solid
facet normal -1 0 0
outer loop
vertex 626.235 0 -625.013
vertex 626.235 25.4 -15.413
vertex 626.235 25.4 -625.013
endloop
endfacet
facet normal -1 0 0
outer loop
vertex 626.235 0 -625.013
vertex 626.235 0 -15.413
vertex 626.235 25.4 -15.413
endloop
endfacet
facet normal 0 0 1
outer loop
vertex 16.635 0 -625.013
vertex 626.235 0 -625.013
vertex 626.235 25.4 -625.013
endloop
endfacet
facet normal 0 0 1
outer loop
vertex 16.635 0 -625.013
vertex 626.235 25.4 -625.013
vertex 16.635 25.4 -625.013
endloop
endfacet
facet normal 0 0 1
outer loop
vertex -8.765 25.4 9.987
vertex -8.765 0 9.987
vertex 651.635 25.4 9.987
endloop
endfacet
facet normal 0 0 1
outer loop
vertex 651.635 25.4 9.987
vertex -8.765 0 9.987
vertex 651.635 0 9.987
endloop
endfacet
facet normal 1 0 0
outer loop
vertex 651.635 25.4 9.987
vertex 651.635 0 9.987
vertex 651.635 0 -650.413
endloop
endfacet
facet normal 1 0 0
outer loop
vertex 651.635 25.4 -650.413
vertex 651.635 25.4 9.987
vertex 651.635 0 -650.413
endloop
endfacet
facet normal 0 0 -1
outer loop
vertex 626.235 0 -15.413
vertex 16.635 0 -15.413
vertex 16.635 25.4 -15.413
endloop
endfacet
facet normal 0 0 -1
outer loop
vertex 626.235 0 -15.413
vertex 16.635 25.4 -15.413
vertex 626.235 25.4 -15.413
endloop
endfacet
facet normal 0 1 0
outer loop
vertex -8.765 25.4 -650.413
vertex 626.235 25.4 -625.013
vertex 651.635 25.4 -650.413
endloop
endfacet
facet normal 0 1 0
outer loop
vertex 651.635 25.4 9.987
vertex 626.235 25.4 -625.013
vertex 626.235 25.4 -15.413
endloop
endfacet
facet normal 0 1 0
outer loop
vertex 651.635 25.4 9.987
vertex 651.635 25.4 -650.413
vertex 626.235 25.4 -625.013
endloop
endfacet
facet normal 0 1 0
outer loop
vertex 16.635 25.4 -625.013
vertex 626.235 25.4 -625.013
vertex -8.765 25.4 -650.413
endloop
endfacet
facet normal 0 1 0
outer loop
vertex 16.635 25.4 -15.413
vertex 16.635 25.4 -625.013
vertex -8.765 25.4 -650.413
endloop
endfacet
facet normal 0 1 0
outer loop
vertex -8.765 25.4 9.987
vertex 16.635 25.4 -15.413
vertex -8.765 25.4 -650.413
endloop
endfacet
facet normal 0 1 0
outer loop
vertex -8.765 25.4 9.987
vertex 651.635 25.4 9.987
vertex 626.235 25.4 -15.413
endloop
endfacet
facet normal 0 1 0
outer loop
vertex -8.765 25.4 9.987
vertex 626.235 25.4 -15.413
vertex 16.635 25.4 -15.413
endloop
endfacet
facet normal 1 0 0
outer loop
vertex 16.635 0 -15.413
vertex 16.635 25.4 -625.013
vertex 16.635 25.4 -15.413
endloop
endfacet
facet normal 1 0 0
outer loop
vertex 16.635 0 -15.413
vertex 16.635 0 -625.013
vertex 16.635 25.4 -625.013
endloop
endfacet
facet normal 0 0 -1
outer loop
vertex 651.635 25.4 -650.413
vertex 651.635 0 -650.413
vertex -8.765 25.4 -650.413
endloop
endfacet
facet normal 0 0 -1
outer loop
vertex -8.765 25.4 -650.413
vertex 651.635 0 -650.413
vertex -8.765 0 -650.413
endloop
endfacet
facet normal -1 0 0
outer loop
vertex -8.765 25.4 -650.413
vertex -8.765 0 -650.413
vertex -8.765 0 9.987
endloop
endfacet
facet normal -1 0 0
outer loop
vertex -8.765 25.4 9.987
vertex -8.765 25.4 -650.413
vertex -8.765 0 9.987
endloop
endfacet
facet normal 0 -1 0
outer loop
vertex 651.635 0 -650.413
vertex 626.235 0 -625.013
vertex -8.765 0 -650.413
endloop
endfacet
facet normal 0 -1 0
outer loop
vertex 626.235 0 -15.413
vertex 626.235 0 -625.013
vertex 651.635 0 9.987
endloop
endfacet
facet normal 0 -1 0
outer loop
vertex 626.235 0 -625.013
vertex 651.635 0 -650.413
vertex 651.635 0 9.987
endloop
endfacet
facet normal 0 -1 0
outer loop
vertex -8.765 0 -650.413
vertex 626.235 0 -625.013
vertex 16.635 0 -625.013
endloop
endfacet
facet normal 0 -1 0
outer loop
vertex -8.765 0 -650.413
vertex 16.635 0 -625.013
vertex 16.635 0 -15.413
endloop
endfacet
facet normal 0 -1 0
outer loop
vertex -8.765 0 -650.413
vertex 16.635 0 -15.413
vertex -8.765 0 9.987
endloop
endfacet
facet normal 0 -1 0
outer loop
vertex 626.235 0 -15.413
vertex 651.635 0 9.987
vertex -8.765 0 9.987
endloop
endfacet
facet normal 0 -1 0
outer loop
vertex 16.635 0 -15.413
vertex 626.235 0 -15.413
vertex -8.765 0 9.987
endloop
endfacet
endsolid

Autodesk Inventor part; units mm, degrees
ref_plane "YZ Plane" through (0, 0, 0) normal (1, 0, 0) x (0, 1, 0)
ref_plane "XZ Plane" through (0, 0, 0) normal (0, 1, 0) x (-1, 0, 0)
ref_plane "XY Plane" through (0, 0, 0) normal (0, 0, 1) x (1, 0, 0)
sketch "Sketch1" plane through (0, 0, 0) normal (0, 1, 0) x (-1, 0, 0)
  line L0 (8.7651, 9.9871) -> (-651.6349, 9.9871)
  line L1 (-651.6349, 9.9871) -> (-651.6349, -650.4129)
  line L2 (-651.6349, -650.4129) -> (8.7651, -650.4129)
  line L3 (8.7651, -650.4129) -> (8.7651, 9.9871)
  line L4 (-16.6349, -15.4129) -> (-626.2349, -15.4129)
  line L5 (-626.2349, -15.4129) -> (-626.2349, -625.0129)
  line L6 (-626.2349, -625.0129) -> (-16.6349, -625.0129)
  line L7 (-16.6349, -625.0129) -> (-16.6349, -15.4129)
  point P0 (0, 0)
  dimension "d0" = 660.4
  dimension "d1" = 660.4
  dimension "d2" = 25.4
sketch "Sketch2" plane through (0, 0, 0) normal (0, 1, 0) x (-1, 0, 0)
  line L0 (-333.5663, -626.2819) -> (-333.5663, -550.0819) construction
  line L1 (-625.3108, -550.0819) -> (-18.6287, -550.0819) construction
  point P0 (0, 0)
  dimension "d3" = 76.2
extrude "Extrusion1" add sketch "Sketch1" along normal blind 25.4
properties part number "Frame Outline"
